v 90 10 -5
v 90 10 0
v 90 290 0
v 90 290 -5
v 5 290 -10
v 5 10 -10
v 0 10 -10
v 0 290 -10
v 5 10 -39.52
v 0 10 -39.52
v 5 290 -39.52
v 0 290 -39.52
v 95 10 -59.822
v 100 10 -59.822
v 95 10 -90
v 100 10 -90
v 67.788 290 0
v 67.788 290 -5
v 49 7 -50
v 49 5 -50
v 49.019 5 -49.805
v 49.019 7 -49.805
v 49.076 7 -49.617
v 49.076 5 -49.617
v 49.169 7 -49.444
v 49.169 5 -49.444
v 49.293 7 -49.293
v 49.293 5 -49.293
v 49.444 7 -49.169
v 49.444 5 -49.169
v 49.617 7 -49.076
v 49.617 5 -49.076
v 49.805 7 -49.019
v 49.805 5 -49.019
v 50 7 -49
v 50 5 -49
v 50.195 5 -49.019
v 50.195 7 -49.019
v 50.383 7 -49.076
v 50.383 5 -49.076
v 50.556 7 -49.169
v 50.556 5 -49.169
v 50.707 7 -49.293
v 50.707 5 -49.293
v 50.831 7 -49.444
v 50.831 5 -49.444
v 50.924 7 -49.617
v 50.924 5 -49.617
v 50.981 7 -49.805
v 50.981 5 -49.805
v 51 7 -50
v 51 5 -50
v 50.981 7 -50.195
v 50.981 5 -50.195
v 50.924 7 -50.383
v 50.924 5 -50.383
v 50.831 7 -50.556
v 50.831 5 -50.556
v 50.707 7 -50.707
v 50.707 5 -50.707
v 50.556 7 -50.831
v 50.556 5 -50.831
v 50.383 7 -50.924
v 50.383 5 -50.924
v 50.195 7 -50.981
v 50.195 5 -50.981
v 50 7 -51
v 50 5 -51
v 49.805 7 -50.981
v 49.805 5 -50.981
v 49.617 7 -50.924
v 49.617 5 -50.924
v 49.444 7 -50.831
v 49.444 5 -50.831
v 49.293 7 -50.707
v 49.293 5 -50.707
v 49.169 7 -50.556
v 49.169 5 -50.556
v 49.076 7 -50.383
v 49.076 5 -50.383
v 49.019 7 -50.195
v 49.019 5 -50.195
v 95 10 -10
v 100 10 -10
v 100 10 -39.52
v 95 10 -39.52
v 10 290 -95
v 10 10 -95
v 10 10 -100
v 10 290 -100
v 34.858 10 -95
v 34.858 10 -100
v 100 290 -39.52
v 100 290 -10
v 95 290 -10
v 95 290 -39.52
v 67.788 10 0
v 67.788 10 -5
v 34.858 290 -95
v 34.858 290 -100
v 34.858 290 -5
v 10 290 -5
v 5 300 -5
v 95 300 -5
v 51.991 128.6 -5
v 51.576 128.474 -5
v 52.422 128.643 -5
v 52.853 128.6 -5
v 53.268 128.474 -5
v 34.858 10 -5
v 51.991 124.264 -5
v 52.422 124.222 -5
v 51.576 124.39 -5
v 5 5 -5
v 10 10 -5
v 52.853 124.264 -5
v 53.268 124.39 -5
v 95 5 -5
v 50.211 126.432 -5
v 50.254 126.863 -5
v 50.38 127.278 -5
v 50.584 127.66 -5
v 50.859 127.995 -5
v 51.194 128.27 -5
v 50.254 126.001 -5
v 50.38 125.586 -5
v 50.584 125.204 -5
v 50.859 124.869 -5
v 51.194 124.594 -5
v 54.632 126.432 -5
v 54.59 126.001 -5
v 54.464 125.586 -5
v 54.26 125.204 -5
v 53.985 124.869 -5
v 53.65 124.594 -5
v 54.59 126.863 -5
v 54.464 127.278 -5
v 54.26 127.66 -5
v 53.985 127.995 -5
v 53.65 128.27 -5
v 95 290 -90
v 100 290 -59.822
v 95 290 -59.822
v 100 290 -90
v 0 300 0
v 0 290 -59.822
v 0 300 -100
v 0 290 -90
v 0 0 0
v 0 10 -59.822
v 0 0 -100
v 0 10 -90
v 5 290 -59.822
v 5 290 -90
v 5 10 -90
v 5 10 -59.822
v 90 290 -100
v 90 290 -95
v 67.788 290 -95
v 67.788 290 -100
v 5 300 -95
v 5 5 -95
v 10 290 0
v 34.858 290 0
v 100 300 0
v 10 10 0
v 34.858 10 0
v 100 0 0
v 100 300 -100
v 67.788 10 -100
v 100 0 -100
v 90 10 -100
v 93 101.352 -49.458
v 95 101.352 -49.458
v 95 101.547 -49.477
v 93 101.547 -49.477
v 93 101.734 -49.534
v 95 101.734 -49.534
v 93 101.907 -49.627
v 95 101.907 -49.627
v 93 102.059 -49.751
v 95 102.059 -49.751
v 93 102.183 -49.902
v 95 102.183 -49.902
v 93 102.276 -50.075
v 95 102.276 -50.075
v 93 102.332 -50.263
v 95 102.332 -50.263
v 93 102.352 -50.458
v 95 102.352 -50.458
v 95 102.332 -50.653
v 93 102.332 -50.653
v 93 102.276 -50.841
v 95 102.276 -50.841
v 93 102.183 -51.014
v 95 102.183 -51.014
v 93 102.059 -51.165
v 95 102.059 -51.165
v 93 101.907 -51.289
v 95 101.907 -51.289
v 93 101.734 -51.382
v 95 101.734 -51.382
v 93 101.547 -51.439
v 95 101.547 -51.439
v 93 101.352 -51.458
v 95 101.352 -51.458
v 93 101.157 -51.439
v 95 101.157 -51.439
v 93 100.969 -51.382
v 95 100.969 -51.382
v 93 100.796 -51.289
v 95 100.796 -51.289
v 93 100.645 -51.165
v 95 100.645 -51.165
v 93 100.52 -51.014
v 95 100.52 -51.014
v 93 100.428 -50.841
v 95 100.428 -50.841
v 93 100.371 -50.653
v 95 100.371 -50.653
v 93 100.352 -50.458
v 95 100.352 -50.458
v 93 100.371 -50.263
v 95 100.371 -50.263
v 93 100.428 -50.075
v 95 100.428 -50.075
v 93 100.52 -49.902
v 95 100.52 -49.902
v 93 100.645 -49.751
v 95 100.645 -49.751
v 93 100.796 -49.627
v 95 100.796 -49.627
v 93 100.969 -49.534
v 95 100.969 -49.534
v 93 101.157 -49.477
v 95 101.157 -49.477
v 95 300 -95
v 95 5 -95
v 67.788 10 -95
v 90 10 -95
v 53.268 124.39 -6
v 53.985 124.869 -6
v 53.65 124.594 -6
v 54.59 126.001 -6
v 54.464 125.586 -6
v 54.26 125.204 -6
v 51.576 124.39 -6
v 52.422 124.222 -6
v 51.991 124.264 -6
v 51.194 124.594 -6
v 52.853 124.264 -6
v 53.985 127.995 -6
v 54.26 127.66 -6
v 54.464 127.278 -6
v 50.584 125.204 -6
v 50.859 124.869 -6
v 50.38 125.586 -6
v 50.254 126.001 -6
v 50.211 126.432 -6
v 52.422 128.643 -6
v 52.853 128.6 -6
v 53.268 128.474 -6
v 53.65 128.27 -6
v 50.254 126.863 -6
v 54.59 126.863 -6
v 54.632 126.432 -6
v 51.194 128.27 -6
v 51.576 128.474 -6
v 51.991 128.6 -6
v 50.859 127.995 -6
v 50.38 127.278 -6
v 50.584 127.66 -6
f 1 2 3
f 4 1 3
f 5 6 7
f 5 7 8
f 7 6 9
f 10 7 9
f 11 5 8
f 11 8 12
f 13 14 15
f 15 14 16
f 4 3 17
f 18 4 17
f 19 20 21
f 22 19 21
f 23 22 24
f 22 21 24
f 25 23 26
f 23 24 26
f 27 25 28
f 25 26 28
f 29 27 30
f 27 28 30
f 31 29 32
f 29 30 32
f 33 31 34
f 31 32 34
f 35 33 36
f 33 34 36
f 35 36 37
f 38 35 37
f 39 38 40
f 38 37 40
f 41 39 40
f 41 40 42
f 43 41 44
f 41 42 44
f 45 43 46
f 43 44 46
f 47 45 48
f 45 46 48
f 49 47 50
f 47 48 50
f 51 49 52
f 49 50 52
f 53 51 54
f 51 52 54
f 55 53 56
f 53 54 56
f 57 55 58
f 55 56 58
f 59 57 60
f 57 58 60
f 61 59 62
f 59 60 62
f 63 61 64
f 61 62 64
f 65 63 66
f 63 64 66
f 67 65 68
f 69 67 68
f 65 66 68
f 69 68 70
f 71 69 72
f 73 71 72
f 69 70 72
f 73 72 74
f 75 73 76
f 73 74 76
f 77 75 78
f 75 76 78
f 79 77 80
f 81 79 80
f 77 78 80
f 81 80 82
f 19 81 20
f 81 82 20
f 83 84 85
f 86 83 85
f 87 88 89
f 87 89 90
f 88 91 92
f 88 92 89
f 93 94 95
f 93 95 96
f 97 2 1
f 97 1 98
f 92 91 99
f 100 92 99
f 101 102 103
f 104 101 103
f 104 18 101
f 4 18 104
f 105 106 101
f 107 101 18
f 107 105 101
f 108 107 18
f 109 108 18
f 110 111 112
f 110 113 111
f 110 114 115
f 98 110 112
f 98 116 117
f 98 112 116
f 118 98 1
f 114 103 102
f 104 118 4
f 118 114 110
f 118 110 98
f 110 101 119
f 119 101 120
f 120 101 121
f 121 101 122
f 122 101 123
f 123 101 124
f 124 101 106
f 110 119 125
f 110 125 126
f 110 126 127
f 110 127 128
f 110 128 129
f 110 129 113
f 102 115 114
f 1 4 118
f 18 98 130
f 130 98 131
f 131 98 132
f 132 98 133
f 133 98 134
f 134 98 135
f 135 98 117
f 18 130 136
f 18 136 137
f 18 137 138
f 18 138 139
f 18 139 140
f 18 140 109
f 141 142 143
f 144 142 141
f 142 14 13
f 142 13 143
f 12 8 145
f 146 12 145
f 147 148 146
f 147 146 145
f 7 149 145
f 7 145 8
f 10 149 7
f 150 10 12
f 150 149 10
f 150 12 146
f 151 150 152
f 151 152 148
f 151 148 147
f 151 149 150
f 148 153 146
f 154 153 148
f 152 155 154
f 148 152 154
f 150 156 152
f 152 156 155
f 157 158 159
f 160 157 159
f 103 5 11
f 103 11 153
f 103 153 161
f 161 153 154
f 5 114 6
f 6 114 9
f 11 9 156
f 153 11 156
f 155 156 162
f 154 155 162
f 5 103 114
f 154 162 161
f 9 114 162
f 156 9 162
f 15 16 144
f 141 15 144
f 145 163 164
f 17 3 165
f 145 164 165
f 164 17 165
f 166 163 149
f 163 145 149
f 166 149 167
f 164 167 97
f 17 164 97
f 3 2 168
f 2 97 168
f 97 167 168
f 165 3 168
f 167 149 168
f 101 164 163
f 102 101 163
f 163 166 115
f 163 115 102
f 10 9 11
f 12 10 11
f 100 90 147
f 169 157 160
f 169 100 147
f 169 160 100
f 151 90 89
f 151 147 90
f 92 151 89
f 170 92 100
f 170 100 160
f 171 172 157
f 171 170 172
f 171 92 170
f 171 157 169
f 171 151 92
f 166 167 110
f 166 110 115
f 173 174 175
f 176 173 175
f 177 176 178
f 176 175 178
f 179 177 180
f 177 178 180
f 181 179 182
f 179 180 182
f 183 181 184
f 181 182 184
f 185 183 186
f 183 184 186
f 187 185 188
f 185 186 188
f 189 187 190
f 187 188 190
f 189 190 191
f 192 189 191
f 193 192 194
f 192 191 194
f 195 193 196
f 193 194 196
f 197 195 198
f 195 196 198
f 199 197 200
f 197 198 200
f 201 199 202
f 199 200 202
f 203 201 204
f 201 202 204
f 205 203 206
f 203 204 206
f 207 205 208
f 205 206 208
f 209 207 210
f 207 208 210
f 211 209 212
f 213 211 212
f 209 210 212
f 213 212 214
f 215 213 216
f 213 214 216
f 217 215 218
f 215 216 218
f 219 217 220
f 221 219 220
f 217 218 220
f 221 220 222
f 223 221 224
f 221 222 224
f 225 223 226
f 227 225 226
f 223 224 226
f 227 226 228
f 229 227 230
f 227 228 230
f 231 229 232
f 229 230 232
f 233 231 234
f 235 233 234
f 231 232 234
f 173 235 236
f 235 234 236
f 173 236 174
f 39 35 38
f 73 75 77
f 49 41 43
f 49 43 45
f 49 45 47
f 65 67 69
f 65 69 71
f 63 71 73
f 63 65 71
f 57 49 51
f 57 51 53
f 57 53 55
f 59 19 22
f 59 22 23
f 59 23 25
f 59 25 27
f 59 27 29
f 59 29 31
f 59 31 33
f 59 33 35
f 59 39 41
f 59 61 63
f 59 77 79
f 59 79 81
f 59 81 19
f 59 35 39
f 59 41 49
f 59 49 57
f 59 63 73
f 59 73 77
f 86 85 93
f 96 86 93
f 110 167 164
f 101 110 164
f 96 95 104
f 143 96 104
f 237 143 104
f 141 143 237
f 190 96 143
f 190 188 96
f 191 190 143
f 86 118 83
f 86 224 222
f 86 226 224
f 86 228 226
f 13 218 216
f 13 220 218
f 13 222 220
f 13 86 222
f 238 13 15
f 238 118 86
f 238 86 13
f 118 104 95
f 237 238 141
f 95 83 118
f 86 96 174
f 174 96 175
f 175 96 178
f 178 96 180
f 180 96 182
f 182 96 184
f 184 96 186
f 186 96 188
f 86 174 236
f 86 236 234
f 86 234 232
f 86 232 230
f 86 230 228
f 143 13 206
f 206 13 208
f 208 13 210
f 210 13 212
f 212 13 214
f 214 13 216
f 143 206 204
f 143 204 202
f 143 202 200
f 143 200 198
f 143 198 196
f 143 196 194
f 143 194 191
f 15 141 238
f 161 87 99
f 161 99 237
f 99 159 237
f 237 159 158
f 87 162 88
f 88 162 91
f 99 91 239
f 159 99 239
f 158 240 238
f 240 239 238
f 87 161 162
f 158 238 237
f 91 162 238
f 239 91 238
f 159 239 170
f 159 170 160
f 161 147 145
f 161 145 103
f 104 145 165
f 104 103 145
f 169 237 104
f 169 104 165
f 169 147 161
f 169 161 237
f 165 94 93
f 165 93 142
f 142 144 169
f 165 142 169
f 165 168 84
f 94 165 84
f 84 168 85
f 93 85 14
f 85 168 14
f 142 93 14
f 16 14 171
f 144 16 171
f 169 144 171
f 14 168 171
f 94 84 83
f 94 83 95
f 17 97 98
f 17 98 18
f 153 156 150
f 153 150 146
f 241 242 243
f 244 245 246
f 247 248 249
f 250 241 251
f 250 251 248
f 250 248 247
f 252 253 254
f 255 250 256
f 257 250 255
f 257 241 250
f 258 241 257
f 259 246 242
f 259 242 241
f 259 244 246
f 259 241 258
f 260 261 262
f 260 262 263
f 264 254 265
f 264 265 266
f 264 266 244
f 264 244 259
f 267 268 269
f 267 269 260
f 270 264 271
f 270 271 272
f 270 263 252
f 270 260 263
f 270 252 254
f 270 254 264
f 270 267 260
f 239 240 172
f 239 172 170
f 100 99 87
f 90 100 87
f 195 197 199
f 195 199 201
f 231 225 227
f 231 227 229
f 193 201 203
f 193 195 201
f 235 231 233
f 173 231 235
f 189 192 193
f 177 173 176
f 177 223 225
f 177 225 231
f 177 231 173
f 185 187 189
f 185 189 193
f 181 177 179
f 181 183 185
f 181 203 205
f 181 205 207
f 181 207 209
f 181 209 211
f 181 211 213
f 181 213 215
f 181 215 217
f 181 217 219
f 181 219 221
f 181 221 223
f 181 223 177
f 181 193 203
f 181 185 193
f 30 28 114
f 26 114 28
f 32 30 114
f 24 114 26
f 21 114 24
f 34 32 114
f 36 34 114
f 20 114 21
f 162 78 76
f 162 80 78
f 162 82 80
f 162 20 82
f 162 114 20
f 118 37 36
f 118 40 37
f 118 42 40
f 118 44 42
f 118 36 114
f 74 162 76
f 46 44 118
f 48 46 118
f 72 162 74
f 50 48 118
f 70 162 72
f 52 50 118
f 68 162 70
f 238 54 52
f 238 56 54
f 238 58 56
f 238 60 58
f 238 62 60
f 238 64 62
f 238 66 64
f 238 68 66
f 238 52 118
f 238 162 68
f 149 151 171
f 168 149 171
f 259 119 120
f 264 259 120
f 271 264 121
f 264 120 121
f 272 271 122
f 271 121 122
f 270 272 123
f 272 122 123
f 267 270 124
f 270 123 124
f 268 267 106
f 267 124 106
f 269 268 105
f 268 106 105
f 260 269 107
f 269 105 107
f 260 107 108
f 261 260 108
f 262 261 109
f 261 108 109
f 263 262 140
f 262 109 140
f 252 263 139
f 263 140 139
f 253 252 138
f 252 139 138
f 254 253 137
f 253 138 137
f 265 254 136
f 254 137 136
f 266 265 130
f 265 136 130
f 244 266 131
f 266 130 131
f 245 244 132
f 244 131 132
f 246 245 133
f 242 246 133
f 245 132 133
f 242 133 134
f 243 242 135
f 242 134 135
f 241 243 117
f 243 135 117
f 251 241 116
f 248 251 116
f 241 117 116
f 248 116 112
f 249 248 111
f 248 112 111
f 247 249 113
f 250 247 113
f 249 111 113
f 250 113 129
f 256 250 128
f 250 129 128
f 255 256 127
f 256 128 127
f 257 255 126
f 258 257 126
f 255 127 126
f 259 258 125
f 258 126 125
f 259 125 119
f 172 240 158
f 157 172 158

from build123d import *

# Parameters (mm, degrees)
SKETCH1_W               = 100
SKETCH1_H               = 100
BOSS_EXTRUDE1_DEPTH     = 300
SHELL1_T                = -5
SKETCH5_W               = 29.520338389
SKETCH5_H               = 280
SKETCH5_W_2             = 30.177604706
CUT_EXTRUDE3_DEPTH      = 332.662479036
CUT_EXTRUDE4_DEPTH      = 332.662479036
CUT_EXTRUDE4_DEPTH_BACK = 332.662479036
SKETCH7_W               = 22.211506019
SKETCH7_H               = 280
SKETCH7_W_2             = 24.857728264
SKETCH8_R               = 2.210472055
BOSS_EXTRUDE2_DEPTH     = 1
BOSS_EXTRUDE3_DEPTH     = 2
SKETCH10_R              = 1
BOSS_EXTRUDE4_DEPTH     = 2


with BuildPart() as part:
    # Sketch1 → Boss-Extrude1 (new body)
    with BuildSketch(Plane(origin=(0, 0, 0), x_dir=(1, 0, 0), z_dir=(0, 1, 0))):
        with Locations((50, 50)):
            Rectangle(SKETCH1_W, SKETCH1_H)
    extrude(amount=BOSS_EXTRUDE1_DEPTH)

    # Shell1
    shell1_openings = [part.faces().sort_by_distance(p)[0] for p in [
        (50, 300, -50),
    ]]
    offset(amount=SHELL1_T, openings=shell1_openings, kind=Kind.INTERSECTION)

    # Sketch5 → Cut-Extrude3 (cut, through all)
    with BuildSketch(Plane(origin=(100, 0, 0), x_dir=(0, 0, -1), z_dir=(1, 0, 0))):
        with Locations((24.760169195, 150)):
            Rectangle(SKETCH5_W, SKETCH5_H)
        with Locations((74.911197647, 150)):
            Rectangle(SKETCH5_W_2, SKETCH5_H)
    extrude(amount=-CUT_EXTRUDE3_DEPTH, mode=Mode.SUBTRACT)

    # Sketch7 → Cut-Extrude4 (cut, two sides: drawn at the far end of the back side and taken through both)
    with BuildSketch(Plane(origin=(0, 0, -100), x_dir=(-1, 0, 0), z_dir=(0, 0, -1)).offset(-CUT_EXTRUDE4_DEPTH_BACK)):
        with Locations((-78.89424699, 150)):
            Rectangle(SKETCH7_W, SKETCH7_H)
        with Locations((-22.428864132, 150)):
            Rectangle(SKETCH7_W_2, SKETCH7_H)
    extrude(amount=CUT_EXTRUDE4_DEPTH + CUT_EXTRUDE4_DEPTH_BACK, mode=Mode.SUBTRACT)

    # Sketch8 → Boss-Extrude2 (add)
    with BuildSketch(Plane(origin=(0, 0, -5), x_dir=(-1, 0, 0), z_dir=(0, 0, -1))):
        with Locations((-52.421904505, 126.432189468)):
            Circle(SKETCH8_R)
    extrude(amount=BOSS_EXTRUDE2_DEPTH)

    # Sketch9 → Boss-Extrude3 (add)
    with BuildSketch(Plane(origin=(0, 5, 0), x_dir=(1, 0, 0), z_dir=(0, 1, 0))):
        with BuildLine():
            ThreePointArc((51, 50), (50, 51), (49, 50))
            Line((49, 50), (51, 50))
        make_face()
        with BuildLine():
            Line((51, 50), (49, 50))
            ThreePointArc((49, 50), (50, 49), (51, 50))
        make_face()
    extrude(amount=BOSS_EXTRUDE3_DEPTH)

    # Sketch10 → Boss-Extrude4 (add)
    with BuildSketch(Plane.ZY.offset(-95)):
        with Locations((-50.457978823, 101.351671268)):
            Circle(SKETCH10_R)
    extrude(amount=BOSS_EXTRUDE4_DEPTH)


solid = part.part
